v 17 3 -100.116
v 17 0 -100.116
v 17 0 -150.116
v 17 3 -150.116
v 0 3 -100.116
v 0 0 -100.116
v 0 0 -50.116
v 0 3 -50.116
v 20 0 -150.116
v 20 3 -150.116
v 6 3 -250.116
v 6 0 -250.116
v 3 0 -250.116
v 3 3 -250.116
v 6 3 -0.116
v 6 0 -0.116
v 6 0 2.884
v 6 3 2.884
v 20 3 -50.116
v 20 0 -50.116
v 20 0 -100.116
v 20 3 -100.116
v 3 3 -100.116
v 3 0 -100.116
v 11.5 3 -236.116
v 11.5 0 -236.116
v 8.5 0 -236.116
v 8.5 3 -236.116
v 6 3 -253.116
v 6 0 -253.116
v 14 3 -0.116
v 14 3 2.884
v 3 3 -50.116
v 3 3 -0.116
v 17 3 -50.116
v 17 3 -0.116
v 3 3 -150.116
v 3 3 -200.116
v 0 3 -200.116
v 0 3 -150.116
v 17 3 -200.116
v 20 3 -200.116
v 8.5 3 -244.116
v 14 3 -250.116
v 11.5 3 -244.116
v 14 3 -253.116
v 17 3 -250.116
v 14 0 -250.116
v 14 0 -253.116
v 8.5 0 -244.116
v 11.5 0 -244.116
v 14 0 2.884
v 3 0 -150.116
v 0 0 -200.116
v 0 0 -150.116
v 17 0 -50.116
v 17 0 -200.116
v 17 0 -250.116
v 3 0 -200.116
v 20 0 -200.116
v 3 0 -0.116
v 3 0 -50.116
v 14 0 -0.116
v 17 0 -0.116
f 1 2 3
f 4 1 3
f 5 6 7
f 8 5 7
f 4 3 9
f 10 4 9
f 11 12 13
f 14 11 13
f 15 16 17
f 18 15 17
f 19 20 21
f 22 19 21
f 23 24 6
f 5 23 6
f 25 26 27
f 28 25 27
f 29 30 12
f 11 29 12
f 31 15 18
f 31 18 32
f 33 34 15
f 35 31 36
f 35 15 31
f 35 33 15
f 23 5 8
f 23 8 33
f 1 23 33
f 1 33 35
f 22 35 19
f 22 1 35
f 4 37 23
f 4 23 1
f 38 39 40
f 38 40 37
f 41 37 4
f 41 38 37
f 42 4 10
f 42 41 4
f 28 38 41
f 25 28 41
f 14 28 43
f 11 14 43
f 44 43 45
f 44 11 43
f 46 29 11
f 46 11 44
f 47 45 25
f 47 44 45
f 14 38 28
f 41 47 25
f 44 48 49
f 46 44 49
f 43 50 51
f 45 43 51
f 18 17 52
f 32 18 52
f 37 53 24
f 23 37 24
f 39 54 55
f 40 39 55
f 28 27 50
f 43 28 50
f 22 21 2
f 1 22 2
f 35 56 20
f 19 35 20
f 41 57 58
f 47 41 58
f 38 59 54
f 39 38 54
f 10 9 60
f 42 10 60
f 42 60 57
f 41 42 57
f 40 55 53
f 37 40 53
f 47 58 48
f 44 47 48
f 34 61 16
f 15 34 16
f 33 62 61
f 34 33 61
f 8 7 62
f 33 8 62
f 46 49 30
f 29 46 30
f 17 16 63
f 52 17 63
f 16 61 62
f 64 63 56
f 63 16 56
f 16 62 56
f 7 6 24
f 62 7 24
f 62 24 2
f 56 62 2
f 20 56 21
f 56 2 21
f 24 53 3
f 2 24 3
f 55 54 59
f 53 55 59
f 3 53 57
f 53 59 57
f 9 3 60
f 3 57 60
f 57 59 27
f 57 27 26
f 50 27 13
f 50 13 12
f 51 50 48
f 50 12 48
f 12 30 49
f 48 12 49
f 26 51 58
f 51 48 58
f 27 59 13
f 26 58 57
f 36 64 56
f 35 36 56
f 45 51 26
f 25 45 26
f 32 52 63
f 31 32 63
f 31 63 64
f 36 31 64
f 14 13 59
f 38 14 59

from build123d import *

# Parameters (mm, degrees)
SALIENTE_EXTRUIR1_DEPTH = 3


with BuildPart() as part:
    # Croquis1 → Saliente-Extruir1 (new body)
    with BuildSketch(Plane(origin=(0, 0, 0), x_dir=(1, 0, 0), z_dir=(0, 1, 0))):
        Polygon((14, 253.116176228), (10, 253.116176228), (6, 253.116176228), (6, 250.116176228), (3, 250.116176228), (3, 200.116176228), (0, 200.116176228), (0, 150.116176228), (3, 150.116176228), (3, 100.116176228), (0, 100.116176228), (0, 50.116176228), (3, 50.116176228), (3, 0.116176228), (6, 0.116176228), (6, -2.883823772), (14, -2.883823772), (14, 0.116176228), (17, 0.116176228), (17, 50.116176228), (20, 50.116176228), (20, 100.116176228), (17, 100.116176228), (17, 150.116176228), (20, 150.116176228), (20, 200.116176228), (17, 200.116176228), (17, 250.116176228), (14, 250.116176228), align=None)
        Polygon((8.5, 244.116176228), (10, 244.116176228), (11.5, 244.116176228), (11.5, 236.116176228), (8.5, 236.116176228), align=None, mode=Mode.SUBTRACT)
    extrude(amount=SALIENTE_EXTRUIR1_DEPTH)


solid = part.part
